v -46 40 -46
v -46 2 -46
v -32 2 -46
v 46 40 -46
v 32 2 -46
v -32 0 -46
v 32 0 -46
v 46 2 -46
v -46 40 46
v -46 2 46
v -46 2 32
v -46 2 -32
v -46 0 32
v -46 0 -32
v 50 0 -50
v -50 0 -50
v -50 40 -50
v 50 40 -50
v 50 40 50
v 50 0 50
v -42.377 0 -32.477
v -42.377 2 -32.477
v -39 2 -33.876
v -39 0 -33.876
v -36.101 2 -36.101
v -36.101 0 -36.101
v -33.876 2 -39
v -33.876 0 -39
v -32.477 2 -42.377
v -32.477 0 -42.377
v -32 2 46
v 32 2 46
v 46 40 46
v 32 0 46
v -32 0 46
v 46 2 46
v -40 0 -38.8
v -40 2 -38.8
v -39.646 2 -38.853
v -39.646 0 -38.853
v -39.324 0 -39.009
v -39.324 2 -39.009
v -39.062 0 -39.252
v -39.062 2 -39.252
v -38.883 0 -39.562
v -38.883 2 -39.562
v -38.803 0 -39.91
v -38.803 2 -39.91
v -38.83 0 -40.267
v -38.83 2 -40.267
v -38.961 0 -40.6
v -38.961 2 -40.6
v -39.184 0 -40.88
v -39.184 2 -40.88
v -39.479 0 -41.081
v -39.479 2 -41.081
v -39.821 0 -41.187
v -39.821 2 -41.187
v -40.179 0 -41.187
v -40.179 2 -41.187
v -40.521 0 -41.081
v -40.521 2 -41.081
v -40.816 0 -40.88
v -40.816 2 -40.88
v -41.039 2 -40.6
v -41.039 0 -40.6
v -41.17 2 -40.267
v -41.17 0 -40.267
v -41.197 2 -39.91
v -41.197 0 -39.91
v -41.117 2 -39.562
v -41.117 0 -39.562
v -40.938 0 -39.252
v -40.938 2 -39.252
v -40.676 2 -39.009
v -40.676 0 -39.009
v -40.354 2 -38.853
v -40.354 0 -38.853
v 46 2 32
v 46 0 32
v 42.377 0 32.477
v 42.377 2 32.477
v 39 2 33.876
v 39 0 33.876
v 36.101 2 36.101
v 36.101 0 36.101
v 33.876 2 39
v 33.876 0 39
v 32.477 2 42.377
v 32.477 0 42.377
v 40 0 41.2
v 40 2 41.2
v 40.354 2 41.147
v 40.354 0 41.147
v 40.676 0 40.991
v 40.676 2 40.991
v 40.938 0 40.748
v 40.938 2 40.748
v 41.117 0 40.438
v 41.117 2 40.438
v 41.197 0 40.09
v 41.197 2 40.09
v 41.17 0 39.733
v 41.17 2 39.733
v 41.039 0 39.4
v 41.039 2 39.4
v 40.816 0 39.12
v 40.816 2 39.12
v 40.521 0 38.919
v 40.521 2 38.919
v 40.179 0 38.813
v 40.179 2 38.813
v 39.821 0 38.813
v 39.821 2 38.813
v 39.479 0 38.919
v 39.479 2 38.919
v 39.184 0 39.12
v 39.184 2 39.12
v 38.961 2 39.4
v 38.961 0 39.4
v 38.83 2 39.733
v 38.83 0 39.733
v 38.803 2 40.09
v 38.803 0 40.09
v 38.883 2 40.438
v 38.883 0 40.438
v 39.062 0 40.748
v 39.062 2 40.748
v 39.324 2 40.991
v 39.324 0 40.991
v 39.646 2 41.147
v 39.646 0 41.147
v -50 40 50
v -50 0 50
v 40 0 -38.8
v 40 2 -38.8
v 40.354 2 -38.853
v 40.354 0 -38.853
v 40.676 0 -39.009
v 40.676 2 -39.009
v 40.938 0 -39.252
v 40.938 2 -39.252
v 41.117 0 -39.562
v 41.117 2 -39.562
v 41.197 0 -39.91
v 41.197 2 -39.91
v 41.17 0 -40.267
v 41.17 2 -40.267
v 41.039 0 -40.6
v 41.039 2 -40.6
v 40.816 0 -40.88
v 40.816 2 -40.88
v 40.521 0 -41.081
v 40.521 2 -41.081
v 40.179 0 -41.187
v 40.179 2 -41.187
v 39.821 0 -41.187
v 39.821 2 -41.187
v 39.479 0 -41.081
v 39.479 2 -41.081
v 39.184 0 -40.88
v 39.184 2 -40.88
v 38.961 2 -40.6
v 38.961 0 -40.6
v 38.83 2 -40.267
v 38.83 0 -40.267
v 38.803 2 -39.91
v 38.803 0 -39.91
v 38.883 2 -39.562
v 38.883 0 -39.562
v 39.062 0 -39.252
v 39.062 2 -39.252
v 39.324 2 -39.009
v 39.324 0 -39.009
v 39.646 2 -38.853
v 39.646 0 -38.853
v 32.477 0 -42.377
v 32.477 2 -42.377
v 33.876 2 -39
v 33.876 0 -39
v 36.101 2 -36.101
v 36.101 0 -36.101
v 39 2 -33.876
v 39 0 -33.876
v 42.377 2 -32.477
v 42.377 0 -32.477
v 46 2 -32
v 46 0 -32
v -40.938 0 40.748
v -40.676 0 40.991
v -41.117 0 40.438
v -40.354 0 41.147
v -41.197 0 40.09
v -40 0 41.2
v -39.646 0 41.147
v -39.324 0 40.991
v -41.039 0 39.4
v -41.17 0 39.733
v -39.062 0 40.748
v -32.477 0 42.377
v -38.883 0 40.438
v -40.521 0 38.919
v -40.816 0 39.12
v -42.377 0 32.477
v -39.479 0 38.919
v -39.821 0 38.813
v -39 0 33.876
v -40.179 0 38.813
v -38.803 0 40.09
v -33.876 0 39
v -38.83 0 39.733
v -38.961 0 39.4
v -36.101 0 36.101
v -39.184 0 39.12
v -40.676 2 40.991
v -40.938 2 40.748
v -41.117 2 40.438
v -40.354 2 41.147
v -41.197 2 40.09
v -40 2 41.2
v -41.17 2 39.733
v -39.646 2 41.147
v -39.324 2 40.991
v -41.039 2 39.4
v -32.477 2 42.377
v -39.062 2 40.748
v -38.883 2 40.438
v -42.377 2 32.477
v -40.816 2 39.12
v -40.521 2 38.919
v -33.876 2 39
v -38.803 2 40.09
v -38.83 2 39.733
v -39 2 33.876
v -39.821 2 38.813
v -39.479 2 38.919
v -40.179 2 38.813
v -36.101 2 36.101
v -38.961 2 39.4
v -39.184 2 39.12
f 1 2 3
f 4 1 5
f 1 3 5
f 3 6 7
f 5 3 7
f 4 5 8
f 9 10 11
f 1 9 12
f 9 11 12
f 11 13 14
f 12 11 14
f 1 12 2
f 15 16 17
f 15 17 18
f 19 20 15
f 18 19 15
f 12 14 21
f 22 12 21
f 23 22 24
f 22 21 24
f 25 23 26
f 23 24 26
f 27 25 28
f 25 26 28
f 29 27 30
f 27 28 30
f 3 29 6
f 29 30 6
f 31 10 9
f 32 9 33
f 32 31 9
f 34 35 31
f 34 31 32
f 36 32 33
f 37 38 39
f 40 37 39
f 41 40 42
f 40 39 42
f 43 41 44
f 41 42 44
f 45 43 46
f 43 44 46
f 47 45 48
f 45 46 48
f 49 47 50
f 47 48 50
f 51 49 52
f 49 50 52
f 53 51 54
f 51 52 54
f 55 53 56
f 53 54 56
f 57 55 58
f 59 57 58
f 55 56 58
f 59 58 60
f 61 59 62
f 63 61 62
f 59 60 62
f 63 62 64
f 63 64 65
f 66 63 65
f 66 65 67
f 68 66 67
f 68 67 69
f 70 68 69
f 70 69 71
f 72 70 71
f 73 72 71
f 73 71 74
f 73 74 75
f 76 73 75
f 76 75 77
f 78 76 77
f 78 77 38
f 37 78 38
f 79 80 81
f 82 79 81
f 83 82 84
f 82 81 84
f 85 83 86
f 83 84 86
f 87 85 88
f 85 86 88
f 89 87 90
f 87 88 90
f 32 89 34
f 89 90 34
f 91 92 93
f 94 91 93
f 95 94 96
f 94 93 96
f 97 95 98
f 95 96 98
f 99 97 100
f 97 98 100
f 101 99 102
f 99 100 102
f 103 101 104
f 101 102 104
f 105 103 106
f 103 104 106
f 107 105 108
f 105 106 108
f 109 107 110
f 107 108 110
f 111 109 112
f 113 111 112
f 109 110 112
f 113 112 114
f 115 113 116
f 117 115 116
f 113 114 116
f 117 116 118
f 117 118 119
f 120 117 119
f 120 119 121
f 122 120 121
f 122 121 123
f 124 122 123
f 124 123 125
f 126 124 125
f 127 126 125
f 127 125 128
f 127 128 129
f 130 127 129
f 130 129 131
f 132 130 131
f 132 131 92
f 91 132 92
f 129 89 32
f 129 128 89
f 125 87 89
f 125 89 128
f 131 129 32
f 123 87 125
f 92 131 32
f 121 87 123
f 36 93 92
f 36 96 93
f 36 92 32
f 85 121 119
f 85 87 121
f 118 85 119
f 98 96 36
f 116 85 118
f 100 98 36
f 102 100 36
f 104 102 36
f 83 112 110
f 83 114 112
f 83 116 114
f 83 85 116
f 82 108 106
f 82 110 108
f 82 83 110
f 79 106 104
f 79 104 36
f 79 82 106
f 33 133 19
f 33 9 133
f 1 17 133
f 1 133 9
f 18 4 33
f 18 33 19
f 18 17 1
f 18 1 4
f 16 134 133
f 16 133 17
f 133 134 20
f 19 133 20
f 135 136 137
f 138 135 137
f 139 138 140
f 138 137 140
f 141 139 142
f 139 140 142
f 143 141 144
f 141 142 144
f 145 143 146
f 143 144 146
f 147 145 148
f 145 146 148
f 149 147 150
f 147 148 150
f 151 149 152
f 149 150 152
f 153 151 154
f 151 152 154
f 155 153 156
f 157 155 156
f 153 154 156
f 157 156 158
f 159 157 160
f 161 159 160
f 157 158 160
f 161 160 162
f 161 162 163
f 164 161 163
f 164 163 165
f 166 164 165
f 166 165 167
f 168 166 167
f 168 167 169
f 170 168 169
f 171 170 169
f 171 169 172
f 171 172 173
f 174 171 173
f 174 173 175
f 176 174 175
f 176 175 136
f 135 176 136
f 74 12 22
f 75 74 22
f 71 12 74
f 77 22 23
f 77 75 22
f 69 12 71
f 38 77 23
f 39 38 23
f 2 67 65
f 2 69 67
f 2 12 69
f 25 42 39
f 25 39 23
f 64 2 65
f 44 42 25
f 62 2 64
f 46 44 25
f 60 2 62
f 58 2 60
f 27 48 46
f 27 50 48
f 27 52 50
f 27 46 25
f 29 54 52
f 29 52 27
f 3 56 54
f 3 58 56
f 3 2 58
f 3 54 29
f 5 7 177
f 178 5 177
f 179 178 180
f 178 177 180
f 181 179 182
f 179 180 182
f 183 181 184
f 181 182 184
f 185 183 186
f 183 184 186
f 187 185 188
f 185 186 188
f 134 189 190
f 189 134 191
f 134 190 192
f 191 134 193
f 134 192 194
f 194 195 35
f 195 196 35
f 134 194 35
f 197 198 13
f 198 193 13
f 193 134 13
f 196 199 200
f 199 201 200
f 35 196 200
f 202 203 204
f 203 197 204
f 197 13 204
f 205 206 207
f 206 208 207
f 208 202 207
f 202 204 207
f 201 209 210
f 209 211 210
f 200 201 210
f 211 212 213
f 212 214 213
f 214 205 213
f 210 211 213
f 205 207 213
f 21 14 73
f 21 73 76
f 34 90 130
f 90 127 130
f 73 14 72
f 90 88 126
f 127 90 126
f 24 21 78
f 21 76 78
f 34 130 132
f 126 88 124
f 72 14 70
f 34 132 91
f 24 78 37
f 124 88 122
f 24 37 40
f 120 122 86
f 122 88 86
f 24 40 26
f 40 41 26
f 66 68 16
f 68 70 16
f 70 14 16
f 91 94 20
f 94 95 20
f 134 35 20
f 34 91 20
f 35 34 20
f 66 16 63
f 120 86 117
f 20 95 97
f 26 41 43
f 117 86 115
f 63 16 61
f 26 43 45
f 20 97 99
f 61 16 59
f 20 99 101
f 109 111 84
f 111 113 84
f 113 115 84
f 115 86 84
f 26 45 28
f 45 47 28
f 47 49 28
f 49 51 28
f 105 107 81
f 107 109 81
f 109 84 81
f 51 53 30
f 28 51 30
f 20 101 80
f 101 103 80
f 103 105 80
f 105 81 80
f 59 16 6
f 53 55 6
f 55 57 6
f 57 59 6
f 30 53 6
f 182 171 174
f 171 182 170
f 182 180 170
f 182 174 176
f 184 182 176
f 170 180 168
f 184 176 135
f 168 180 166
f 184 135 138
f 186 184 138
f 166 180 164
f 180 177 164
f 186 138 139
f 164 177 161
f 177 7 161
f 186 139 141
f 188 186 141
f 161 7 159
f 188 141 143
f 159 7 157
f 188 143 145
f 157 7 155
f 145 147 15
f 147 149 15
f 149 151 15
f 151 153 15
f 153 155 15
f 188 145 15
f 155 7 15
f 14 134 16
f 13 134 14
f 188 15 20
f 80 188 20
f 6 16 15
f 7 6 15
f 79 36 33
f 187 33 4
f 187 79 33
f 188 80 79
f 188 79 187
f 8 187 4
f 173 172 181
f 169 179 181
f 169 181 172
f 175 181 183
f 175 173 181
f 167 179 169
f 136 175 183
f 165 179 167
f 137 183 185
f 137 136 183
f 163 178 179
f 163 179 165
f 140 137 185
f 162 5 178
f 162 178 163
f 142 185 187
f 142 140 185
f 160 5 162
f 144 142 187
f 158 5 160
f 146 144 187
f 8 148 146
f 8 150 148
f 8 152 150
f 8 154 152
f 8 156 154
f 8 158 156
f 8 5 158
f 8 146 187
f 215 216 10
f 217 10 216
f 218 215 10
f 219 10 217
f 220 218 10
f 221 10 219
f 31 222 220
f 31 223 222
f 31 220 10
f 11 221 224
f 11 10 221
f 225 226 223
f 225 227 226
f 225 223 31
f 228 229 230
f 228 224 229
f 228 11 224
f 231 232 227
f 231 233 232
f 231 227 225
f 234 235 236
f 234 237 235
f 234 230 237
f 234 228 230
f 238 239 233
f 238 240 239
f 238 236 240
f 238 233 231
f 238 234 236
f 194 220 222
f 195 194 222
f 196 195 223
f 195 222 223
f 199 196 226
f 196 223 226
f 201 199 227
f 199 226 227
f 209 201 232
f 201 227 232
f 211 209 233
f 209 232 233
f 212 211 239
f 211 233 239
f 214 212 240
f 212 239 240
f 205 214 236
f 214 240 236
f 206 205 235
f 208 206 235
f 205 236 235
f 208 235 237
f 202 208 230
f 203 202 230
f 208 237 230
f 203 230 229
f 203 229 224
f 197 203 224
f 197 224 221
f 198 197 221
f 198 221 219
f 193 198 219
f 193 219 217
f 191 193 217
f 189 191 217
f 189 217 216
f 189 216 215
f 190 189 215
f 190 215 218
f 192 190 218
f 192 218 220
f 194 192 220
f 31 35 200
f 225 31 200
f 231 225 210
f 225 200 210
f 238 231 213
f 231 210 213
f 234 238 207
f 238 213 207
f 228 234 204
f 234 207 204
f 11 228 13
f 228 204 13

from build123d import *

# Parameters (mm, degrees)
SKETCH1_W            = 100
SKETCH1_H            = 100
SKETCH1_W_2          = 92
SKETCH1_H_2          = 92
BOSS_EXTRUDE1_DEPTH  = 40
BOSS_EXTRUDE2_DEPTH  = 2
M2_CLEARANCE_HOLE1_D = 2.4


with BuildPart() as part:
    # Sketch1 → Boss-Extrude1 (new body)
    with BuildSketch(Plane(origin=(0, 0, 0), x_dir=(1, 0, 0), z_dir=(0, 1, 0))):
        Rectangle(SKETCH1_W, SKETCH1_H)
        Rectangle(SKETCH1_W_2, SKETCH1_H_2, mode=Mode.SUBTRACT)
    extrude(amount=BOSS_EXTRUDE1_DEPTH)

    # Sketch2 → Boss-Extrude2 (add)
    with BuildSketch(Plane(origin=(0, 0, 0), x_dir=(-1, 0, 0), z_dir=(0, -1, 0))):
        with BuildLine():
            Line((-46, 32), (-46, 46))
            Line((-46, 46), (-32, 46))
            ThreePointArc((-32, 46), (-36.100505063, 36.100505063), (-46, 32))
        make_face()
        with BuildLine():
            Line((32, 46), (46, 46))
            Line((46, 46), (46, 32))
            ThreePointArc((46, 32), (36.100505063, 36.100505063), (32, 46))
        make_face()
        with BuildLine():
            Line((46, -32), (46, -46))
            Line((46, -46), (32, -46))
            ThreePointArc((32, -46), (36.100505063, -36.100505063), (46, -32))
        make_face()
        with BuildLine():
            Line((-32, -46), (-46, -46))
            Line((-46, -46), (-46, -32))
            ThreePointArc((-46, -32), (-36.100505063, -36.100505063), (-32, -46))
        make_face()
    extrude(amount=-BOSS_EXTRUDE2_DEPTH)

    # M2 Clearance Hole1 (through all)
    with Locations(Plane(origin=(40, 0, 40), x_dir=(0, 0, -1), z_dir=(0, -1, 0))):
        with Locations((0, 0), (80, 0), (80, -80), (0, -80)):
            Hole(M2_CLEARANCE_HOLE1_D / 2)


solid = part.part
